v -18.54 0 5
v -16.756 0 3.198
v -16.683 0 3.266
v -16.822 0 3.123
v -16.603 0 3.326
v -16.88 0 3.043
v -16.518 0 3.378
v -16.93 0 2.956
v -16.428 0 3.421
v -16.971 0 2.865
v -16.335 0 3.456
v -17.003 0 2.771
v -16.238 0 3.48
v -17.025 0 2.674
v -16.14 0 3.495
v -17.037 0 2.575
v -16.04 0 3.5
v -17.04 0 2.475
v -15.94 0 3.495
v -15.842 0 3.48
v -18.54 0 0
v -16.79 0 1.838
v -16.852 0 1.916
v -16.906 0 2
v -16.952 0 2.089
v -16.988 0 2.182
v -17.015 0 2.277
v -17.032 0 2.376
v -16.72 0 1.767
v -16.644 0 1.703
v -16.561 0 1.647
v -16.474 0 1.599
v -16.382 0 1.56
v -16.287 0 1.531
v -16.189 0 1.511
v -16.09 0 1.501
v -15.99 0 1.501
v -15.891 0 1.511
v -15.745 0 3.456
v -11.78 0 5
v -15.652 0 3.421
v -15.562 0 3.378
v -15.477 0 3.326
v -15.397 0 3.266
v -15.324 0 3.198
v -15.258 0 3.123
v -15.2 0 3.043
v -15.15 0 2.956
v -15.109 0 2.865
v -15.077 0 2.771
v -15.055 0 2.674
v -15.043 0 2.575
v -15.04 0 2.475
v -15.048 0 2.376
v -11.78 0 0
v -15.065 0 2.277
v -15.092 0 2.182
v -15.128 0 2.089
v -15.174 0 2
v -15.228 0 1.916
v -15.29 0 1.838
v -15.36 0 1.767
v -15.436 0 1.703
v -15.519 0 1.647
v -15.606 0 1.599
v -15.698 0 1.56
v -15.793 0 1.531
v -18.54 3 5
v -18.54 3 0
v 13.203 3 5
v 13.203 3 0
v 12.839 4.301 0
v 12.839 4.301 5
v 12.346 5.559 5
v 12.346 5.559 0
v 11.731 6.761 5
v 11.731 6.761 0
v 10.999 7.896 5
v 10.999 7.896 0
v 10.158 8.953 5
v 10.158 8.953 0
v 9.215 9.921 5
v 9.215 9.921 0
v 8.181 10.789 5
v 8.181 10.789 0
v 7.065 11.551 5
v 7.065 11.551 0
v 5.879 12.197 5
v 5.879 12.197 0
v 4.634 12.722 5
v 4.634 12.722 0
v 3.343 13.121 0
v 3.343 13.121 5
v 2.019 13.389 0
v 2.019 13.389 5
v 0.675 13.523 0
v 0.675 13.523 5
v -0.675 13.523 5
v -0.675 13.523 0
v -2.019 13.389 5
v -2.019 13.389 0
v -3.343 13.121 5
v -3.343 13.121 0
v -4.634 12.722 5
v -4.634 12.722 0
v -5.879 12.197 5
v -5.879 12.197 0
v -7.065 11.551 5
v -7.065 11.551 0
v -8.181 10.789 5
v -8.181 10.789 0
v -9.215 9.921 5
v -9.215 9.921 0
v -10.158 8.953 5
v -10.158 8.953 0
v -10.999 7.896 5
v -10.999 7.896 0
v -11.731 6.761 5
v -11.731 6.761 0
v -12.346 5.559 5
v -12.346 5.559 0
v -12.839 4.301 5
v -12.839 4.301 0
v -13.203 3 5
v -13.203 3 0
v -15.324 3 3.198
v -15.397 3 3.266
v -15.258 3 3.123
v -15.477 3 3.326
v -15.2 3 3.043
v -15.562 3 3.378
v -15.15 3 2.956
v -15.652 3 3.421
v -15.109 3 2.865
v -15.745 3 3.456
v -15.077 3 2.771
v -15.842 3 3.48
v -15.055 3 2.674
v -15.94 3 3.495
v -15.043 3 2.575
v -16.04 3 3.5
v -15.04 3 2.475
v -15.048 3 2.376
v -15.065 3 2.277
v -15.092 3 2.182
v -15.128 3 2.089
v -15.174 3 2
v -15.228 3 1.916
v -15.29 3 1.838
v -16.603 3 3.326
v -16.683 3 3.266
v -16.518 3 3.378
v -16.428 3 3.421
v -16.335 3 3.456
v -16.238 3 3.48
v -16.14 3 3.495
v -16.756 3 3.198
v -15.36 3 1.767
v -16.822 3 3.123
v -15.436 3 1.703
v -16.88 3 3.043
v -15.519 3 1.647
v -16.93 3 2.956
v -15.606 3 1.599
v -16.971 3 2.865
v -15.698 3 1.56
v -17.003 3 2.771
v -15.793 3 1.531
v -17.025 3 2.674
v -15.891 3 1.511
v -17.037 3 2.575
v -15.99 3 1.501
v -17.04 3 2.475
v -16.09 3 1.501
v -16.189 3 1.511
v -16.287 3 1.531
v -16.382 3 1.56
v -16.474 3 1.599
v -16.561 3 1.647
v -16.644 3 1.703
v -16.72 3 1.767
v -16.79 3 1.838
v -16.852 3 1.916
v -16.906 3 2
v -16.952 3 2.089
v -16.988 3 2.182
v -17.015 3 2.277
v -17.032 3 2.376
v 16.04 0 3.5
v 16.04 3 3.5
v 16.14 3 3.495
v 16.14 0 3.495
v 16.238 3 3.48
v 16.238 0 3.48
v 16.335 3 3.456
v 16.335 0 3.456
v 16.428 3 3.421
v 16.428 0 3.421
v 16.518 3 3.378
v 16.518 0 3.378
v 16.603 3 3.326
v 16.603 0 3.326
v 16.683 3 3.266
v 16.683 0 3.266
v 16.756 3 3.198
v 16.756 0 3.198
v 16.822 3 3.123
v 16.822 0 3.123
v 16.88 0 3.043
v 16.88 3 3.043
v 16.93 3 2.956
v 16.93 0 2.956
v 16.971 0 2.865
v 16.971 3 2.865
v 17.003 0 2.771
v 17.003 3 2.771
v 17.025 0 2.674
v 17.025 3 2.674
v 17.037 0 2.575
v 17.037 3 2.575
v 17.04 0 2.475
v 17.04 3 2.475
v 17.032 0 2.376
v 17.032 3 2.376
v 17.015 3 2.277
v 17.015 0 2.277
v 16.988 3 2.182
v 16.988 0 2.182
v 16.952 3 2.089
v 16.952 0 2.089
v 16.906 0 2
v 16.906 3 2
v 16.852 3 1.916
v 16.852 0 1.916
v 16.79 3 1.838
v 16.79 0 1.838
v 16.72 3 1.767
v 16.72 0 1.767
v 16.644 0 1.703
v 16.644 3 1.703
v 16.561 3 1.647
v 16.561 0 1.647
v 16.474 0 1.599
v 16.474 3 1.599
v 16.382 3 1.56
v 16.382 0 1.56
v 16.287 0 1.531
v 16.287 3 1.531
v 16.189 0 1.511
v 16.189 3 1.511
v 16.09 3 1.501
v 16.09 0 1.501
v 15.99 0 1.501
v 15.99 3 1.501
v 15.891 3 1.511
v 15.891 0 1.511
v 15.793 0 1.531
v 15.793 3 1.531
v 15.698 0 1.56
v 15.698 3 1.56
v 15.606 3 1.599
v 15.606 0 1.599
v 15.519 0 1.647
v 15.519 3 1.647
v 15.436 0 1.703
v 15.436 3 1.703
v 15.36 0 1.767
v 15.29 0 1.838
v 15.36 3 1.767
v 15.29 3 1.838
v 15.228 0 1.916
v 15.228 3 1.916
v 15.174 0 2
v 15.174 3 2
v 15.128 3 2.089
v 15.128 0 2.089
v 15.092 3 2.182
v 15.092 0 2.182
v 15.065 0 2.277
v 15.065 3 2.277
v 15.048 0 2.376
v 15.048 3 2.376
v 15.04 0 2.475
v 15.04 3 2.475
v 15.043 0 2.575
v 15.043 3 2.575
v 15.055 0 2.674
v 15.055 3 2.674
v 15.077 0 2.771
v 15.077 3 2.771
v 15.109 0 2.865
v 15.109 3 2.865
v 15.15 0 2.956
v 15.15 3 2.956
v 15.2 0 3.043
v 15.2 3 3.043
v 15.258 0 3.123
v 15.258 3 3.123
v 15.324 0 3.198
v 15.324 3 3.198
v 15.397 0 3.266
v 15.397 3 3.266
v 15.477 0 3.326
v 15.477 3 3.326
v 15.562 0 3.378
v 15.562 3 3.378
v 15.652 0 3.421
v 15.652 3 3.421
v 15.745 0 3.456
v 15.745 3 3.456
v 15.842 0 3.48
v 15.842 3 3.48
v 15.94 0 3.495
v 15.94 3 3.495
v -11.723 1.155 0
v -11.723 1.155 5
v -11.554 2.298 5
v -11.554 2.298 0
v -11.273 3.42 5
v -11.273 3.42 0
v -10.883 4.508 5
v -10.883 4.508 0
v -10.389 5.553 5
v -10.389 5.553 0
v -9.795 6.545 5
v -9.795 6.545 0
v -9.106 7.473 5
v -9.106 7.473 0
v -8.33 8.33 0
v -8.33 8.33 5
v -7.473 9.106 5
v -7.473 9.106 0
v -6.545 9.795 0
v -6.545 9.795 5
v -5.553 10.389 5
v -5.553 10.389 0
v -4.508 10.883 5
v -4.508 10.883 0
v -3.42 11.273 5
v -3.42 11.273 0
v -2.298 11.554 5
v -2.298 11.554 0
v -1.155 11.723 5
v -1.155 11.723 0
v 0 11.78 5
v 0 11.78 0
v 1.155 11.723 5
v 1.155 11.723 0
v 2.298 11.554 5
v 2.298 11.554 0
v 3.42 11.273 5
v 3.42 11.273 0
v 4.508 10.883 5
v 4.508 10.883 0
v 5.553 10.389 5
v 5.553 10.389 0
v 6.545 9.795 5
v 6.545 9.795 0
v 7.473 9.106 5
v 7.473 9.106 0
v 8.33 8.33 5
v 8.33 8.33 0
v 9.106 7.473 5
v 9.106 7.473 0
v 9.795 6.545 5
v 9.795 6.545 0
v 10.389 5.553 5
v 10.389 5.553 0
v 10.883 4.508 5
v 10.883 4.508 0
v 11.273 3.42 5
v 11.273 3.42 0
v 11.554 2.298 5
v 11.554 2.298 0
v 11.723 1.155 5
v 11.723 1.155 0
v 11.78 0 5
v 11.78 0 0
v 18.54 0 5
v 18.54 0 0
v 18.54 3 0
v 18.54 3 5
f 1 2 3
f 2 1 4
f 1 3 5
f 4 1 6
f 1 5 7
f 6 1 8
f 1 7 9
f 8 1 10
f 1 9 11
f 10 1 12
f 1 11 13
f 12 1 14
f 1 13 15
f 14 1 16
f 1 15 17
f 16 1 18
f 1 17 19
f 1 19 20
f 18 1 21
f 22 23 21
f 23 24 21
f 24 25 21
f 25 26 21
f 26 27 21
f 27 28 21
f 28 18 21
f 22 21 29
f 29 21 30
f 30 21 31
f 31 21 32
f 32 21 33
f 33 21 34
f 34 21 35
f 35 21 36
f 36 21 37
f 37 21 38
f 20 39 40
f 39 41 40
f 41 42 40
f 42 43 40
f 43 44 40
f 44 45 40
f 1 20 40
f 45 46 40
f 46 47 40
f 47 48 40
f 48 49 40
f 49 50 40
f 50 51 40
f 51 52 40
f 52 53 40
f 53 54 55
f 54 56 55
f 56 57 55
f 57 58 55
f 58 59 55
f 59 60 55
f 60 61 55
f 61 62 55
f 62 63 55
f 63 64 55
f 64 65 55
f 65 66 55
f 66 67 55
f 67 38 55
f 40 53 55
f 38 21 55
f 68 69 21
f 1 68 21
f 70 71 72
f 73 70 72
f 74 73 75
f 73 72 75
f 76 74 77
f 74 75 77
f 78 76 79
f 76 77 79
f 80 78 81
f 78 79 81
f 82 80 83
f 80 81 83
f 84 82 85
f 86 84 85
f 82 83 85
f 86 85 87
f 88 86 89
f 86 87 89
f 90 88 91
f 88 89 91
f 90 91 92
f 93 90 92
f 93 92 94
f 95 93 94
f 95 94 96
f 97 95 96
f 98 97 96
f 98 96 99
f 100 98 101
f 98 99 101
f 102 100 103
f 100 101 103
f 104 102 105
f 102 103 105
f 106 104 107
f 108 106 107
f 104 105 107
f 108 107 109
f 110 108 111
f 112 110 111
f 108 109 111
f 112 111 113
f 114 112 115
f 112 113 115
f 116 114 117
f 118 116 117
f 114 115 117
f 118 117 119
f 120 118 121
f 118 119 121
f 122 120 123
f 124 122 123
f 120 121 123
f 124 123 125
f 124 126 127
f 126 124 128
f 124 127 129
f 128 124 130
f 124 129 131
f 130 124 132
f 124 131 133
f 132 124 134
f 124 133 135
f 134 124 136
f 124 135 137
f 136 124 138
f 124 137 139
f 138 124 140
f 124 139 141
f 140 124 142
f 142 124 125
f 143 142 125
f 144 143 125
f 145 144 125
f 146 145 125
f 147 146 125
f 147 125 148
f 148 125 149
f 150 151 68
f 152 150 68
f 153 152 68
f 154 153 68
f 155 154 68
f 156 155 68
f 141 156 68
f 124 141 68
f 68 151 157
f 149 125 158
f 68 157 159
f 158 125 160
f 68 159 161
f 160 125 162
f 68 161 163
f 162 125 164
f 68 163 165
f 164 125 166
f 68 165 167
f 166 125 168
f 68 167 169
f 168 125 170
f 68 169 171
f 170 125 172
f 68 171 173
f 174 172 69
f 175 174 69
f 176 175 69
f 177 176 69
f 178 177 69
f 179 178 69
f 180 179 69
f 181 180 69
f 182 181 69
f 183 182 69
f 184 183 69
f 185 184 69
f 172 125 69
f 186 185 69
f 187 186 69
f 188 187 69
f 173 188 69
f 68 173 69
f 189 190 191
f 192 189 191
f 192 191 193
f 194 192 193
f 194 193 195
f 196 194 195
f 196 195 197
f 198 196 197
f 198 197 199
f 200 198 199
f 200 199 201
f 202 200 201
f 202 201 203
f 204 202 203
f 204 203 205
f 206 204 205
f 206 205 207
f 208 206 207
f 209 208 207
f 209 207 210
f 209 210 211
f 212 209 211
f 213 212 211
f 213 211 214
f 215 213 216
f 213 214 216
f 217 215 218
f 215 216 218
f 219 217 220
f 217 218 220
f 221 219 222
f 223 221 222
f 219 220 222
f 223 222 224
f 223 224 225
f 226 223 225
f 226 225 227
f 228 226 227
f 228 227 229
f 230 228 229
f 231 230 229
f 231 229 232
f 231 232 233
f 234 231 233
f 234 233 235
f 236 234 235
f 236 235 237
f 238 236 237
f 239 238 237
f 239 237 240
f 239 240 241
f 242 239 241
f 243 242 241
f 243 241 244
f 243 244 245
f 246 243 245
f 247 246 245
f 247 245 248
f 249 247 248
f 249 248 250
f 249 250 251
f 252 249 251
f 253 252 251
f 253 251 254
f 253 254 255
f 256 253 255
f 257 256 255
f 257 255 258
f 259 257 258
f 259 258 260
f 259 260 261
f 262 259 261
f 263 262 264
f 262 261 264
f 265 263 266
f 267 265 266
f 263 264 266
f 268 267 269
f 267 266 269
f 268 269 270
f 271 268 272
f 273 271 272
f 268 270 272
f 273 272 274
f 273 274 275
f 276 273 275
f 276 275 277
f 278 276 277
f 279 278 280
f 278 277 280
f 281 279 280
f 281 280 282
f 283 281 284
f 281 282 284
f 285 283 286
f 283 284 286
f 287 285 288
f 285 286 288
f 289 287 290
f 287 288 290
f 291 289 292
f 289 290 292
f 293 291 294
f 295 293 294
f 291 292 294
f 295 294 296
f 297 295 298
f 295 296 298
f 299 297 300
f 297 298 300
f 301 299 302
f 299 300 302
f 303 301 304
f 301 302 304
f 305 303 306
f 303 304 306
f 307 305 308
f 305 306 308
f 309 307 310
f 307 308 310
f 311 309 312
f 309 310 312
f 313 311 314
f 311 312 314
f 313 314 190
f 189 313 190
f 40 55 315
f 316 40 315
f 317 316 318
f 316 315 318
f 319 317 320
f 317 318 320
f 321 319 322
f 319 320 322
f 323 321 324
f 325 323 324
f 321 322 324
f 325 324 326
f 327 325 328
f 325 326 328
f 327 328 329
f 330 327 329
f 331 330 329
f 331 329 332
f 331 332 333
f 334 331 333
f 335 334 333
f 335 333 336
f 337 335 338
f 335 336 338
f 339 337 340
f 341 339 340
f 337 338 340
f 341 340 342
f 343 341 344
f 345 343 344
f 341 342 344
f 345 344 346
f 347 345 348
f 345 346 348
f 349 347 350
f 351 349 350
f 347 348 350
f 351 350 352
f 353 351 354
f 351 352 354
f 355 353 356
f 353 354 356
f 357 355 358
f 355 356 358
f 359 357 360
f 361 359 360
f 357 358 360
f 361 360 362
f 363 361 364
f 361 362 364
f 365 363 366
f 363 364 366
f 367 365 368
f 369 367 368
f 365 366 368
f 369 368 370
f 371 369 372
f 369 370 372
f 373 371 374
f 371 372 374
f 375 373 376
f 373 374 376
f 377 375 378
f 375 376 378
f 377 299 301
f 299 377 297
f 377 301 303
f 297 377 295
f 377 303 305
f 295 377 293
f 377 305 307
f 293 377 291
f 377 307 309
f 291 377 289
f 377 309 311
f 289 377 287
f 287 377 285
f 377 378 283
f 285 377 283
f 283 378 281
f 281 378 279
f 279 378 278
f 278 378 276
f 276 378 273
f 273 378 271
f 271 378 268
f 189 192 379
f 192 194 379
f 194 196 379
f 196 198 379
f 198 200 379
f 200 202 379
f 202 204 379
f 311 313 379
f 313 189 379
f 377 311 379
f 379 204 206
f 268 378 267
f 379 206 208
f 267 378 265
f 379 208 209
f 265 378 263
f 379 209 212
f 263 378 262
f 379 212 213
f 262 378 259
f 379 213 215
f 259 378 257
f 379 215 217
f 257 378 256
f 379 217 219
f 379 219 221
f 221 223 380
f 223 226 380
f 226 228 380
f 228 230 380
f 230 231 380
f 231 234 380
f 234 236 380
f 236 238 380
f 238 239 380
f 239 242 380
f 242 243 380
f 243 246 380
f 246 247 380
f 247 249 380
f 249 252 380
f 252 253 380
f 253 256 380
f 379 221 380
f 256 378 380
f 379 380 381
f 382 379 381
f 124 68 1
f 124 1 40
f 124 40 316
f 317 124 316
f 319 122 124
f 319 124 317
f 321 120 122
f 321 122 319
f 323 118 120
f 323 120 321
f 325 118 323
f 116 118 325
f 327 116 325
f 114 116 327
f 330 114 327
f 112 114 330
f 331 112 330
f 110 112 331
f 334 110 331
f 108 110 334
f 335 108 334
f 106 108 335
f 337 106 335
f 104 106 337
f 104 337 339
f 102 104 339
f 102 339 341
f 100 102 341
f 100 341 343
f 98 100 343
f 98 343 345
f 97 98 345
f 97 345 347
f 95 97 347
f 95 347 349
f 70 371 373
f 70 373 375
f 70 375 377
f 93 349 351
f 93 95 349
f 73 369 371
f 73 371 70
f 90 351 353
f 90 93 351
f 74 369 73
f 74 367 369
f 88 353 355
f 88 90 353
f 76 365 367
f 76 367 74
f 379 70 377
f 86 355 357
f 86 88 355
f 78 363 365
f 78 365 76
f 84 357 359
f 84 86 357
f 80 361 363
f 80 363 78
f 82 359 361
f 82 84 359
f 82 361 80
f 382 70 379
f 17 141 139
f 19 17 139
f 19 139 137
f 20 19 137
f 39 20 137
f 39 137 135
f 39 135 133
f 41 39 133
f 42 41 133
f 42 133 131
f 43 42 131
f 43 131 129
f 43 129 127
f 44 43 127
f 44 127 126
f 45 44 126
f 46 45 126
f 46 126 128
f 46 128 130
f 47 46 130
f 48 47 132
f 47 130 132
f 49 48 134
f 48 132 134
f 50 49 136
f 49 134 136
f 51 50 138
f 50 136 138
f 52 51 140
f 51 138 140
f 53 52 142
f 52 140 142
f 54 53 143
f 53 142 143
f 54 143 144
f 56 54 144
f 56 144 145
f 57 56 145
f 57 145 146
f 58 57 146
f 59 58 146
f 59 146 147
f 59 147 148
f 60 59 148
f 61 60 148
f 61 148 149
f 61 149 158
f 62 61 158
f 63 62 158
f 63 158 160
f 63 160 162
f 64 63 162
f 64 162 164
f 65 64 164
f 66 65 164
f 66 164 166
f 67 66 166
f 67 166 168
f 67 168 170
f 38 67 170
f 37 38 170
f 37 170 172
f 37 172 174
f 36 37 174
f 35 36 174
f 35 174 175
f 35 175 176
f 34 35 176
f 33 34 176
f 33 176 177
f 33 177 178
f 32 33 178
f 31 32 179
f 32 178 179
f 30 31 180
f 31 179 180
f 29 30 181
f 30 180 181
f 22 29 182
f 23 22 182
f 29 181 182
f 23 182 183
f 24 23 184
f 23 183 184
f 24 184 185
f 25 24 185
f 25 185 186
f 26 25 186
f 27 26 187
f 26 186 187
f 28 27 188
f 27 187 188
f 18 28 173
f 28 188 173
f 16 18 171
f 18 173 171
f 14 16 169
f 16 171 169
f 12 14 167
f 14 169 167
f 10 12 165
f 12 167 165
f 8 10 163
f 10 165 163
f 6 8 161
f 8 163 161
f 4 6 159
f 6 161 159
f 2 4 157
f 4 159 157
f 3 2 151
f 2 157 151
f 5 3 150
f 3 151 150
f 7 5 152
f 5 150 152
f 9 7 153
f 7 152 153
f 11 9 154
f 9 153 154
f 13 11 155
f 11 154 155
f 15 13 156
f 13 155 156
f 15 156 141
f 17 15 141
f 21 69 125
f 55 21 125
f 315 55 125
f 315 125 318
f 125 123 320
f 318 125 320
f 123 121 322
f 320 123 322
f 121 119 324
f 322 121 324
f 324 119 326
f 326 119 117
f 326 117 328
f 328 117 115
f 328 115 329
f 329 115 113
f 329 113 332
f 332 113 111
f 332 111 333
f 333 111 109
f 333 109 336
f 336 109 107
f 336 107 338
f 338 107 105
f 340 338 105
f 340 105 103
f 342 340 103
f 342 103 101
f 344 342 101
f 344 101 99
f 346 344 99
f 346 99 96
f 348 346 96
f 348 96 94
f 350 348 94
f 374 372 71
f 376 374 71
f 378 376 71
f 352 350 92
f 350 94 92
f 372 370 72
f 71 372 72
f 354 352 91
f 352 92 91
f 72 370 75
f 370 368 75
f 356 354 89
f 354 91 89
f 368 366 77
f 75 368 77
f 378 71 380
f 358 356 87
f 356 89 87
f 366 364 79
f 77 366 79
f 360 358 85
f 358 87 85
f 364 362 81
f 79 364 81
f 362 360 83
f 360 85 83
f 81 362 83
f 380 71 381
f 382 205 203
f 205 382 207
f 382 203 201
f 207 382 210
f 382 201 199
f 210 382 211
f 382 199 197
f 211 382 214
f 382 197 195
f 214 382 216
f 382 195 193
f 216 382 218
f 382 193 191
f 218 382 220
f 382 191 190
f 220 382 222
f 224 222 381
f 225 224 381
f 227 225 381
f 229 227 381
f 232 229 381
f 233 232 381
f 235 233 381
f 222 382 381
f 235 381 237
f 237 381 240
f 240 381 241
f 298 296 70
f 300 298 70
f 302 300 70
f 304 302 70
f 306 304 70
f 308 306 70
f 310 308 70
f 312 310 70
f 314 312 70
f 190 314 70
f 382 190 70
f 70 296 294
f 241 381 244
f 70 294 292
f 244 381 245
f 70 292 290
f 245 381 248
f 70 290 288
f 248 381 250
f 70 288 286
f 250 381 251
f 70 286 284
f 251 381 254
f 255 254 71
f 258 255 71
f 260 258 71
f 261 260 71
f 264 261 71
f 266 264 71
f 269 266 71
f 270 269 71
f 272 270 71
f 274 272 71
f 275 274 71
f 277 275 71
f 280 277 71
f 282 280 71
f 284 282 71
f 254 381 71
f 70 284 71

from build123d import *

# Parameters (mm, degrees)
BOSS_EXTRUDE1_DEPTH = 5
SKETCH2_R           = 1
CUT_EXTRUDE1_DEPTH  = 5


with BuildPart() as part:
    # Sketch1 → Boss-Extrude1 (new body)
    with BuildSketch(Plane.XY):
        with BuildLine():
            Line((18.54, 0), (18.54, 3))
            Line((18.54, 3), (13.203469241, 3))
            ThreePointArc((13.203469241, 3), (0, 13.54), (-13.203469241, 3))
            Line((-13.203469241, 3), (-18.54, 3))
            Line((-18.54, 3), (-18.54, 0))
            Line((-18.54, 0), (-13.54, 0))
            Line((-13.54, 0), (-11.78, 0))
            ThreePointArc((-11.78, 0), (0, 11.78), (11.78, 0))
            Line((11.78, 0), (13.54, 0))
            Line((13.54, 0), (18.54, 0))
        make_face()
    extrude(amount=BOSS_EXTRUDE1_DEPTH)

    # Sketch2 → Cut-Extrude1 (cut)
    with BuildSketch(Plane(origin=(0, 3, 0), x_dir=(1, 0, 0), z_dir=(0, 1, 0))):
        with Locations(Location((-16.04, -2.5, 0), (0, 0, 270))):
            Circle(SKETCH2_R)
        with Locations(Location((16.04, -2.5, 0), (0, 0, 270))):
            Circle(SKETCH2_R)
    extrude(amount=-CUT_EXTRUDE1_DEPTH, mode=Mode.SUBTRACT)


solid = part.part
